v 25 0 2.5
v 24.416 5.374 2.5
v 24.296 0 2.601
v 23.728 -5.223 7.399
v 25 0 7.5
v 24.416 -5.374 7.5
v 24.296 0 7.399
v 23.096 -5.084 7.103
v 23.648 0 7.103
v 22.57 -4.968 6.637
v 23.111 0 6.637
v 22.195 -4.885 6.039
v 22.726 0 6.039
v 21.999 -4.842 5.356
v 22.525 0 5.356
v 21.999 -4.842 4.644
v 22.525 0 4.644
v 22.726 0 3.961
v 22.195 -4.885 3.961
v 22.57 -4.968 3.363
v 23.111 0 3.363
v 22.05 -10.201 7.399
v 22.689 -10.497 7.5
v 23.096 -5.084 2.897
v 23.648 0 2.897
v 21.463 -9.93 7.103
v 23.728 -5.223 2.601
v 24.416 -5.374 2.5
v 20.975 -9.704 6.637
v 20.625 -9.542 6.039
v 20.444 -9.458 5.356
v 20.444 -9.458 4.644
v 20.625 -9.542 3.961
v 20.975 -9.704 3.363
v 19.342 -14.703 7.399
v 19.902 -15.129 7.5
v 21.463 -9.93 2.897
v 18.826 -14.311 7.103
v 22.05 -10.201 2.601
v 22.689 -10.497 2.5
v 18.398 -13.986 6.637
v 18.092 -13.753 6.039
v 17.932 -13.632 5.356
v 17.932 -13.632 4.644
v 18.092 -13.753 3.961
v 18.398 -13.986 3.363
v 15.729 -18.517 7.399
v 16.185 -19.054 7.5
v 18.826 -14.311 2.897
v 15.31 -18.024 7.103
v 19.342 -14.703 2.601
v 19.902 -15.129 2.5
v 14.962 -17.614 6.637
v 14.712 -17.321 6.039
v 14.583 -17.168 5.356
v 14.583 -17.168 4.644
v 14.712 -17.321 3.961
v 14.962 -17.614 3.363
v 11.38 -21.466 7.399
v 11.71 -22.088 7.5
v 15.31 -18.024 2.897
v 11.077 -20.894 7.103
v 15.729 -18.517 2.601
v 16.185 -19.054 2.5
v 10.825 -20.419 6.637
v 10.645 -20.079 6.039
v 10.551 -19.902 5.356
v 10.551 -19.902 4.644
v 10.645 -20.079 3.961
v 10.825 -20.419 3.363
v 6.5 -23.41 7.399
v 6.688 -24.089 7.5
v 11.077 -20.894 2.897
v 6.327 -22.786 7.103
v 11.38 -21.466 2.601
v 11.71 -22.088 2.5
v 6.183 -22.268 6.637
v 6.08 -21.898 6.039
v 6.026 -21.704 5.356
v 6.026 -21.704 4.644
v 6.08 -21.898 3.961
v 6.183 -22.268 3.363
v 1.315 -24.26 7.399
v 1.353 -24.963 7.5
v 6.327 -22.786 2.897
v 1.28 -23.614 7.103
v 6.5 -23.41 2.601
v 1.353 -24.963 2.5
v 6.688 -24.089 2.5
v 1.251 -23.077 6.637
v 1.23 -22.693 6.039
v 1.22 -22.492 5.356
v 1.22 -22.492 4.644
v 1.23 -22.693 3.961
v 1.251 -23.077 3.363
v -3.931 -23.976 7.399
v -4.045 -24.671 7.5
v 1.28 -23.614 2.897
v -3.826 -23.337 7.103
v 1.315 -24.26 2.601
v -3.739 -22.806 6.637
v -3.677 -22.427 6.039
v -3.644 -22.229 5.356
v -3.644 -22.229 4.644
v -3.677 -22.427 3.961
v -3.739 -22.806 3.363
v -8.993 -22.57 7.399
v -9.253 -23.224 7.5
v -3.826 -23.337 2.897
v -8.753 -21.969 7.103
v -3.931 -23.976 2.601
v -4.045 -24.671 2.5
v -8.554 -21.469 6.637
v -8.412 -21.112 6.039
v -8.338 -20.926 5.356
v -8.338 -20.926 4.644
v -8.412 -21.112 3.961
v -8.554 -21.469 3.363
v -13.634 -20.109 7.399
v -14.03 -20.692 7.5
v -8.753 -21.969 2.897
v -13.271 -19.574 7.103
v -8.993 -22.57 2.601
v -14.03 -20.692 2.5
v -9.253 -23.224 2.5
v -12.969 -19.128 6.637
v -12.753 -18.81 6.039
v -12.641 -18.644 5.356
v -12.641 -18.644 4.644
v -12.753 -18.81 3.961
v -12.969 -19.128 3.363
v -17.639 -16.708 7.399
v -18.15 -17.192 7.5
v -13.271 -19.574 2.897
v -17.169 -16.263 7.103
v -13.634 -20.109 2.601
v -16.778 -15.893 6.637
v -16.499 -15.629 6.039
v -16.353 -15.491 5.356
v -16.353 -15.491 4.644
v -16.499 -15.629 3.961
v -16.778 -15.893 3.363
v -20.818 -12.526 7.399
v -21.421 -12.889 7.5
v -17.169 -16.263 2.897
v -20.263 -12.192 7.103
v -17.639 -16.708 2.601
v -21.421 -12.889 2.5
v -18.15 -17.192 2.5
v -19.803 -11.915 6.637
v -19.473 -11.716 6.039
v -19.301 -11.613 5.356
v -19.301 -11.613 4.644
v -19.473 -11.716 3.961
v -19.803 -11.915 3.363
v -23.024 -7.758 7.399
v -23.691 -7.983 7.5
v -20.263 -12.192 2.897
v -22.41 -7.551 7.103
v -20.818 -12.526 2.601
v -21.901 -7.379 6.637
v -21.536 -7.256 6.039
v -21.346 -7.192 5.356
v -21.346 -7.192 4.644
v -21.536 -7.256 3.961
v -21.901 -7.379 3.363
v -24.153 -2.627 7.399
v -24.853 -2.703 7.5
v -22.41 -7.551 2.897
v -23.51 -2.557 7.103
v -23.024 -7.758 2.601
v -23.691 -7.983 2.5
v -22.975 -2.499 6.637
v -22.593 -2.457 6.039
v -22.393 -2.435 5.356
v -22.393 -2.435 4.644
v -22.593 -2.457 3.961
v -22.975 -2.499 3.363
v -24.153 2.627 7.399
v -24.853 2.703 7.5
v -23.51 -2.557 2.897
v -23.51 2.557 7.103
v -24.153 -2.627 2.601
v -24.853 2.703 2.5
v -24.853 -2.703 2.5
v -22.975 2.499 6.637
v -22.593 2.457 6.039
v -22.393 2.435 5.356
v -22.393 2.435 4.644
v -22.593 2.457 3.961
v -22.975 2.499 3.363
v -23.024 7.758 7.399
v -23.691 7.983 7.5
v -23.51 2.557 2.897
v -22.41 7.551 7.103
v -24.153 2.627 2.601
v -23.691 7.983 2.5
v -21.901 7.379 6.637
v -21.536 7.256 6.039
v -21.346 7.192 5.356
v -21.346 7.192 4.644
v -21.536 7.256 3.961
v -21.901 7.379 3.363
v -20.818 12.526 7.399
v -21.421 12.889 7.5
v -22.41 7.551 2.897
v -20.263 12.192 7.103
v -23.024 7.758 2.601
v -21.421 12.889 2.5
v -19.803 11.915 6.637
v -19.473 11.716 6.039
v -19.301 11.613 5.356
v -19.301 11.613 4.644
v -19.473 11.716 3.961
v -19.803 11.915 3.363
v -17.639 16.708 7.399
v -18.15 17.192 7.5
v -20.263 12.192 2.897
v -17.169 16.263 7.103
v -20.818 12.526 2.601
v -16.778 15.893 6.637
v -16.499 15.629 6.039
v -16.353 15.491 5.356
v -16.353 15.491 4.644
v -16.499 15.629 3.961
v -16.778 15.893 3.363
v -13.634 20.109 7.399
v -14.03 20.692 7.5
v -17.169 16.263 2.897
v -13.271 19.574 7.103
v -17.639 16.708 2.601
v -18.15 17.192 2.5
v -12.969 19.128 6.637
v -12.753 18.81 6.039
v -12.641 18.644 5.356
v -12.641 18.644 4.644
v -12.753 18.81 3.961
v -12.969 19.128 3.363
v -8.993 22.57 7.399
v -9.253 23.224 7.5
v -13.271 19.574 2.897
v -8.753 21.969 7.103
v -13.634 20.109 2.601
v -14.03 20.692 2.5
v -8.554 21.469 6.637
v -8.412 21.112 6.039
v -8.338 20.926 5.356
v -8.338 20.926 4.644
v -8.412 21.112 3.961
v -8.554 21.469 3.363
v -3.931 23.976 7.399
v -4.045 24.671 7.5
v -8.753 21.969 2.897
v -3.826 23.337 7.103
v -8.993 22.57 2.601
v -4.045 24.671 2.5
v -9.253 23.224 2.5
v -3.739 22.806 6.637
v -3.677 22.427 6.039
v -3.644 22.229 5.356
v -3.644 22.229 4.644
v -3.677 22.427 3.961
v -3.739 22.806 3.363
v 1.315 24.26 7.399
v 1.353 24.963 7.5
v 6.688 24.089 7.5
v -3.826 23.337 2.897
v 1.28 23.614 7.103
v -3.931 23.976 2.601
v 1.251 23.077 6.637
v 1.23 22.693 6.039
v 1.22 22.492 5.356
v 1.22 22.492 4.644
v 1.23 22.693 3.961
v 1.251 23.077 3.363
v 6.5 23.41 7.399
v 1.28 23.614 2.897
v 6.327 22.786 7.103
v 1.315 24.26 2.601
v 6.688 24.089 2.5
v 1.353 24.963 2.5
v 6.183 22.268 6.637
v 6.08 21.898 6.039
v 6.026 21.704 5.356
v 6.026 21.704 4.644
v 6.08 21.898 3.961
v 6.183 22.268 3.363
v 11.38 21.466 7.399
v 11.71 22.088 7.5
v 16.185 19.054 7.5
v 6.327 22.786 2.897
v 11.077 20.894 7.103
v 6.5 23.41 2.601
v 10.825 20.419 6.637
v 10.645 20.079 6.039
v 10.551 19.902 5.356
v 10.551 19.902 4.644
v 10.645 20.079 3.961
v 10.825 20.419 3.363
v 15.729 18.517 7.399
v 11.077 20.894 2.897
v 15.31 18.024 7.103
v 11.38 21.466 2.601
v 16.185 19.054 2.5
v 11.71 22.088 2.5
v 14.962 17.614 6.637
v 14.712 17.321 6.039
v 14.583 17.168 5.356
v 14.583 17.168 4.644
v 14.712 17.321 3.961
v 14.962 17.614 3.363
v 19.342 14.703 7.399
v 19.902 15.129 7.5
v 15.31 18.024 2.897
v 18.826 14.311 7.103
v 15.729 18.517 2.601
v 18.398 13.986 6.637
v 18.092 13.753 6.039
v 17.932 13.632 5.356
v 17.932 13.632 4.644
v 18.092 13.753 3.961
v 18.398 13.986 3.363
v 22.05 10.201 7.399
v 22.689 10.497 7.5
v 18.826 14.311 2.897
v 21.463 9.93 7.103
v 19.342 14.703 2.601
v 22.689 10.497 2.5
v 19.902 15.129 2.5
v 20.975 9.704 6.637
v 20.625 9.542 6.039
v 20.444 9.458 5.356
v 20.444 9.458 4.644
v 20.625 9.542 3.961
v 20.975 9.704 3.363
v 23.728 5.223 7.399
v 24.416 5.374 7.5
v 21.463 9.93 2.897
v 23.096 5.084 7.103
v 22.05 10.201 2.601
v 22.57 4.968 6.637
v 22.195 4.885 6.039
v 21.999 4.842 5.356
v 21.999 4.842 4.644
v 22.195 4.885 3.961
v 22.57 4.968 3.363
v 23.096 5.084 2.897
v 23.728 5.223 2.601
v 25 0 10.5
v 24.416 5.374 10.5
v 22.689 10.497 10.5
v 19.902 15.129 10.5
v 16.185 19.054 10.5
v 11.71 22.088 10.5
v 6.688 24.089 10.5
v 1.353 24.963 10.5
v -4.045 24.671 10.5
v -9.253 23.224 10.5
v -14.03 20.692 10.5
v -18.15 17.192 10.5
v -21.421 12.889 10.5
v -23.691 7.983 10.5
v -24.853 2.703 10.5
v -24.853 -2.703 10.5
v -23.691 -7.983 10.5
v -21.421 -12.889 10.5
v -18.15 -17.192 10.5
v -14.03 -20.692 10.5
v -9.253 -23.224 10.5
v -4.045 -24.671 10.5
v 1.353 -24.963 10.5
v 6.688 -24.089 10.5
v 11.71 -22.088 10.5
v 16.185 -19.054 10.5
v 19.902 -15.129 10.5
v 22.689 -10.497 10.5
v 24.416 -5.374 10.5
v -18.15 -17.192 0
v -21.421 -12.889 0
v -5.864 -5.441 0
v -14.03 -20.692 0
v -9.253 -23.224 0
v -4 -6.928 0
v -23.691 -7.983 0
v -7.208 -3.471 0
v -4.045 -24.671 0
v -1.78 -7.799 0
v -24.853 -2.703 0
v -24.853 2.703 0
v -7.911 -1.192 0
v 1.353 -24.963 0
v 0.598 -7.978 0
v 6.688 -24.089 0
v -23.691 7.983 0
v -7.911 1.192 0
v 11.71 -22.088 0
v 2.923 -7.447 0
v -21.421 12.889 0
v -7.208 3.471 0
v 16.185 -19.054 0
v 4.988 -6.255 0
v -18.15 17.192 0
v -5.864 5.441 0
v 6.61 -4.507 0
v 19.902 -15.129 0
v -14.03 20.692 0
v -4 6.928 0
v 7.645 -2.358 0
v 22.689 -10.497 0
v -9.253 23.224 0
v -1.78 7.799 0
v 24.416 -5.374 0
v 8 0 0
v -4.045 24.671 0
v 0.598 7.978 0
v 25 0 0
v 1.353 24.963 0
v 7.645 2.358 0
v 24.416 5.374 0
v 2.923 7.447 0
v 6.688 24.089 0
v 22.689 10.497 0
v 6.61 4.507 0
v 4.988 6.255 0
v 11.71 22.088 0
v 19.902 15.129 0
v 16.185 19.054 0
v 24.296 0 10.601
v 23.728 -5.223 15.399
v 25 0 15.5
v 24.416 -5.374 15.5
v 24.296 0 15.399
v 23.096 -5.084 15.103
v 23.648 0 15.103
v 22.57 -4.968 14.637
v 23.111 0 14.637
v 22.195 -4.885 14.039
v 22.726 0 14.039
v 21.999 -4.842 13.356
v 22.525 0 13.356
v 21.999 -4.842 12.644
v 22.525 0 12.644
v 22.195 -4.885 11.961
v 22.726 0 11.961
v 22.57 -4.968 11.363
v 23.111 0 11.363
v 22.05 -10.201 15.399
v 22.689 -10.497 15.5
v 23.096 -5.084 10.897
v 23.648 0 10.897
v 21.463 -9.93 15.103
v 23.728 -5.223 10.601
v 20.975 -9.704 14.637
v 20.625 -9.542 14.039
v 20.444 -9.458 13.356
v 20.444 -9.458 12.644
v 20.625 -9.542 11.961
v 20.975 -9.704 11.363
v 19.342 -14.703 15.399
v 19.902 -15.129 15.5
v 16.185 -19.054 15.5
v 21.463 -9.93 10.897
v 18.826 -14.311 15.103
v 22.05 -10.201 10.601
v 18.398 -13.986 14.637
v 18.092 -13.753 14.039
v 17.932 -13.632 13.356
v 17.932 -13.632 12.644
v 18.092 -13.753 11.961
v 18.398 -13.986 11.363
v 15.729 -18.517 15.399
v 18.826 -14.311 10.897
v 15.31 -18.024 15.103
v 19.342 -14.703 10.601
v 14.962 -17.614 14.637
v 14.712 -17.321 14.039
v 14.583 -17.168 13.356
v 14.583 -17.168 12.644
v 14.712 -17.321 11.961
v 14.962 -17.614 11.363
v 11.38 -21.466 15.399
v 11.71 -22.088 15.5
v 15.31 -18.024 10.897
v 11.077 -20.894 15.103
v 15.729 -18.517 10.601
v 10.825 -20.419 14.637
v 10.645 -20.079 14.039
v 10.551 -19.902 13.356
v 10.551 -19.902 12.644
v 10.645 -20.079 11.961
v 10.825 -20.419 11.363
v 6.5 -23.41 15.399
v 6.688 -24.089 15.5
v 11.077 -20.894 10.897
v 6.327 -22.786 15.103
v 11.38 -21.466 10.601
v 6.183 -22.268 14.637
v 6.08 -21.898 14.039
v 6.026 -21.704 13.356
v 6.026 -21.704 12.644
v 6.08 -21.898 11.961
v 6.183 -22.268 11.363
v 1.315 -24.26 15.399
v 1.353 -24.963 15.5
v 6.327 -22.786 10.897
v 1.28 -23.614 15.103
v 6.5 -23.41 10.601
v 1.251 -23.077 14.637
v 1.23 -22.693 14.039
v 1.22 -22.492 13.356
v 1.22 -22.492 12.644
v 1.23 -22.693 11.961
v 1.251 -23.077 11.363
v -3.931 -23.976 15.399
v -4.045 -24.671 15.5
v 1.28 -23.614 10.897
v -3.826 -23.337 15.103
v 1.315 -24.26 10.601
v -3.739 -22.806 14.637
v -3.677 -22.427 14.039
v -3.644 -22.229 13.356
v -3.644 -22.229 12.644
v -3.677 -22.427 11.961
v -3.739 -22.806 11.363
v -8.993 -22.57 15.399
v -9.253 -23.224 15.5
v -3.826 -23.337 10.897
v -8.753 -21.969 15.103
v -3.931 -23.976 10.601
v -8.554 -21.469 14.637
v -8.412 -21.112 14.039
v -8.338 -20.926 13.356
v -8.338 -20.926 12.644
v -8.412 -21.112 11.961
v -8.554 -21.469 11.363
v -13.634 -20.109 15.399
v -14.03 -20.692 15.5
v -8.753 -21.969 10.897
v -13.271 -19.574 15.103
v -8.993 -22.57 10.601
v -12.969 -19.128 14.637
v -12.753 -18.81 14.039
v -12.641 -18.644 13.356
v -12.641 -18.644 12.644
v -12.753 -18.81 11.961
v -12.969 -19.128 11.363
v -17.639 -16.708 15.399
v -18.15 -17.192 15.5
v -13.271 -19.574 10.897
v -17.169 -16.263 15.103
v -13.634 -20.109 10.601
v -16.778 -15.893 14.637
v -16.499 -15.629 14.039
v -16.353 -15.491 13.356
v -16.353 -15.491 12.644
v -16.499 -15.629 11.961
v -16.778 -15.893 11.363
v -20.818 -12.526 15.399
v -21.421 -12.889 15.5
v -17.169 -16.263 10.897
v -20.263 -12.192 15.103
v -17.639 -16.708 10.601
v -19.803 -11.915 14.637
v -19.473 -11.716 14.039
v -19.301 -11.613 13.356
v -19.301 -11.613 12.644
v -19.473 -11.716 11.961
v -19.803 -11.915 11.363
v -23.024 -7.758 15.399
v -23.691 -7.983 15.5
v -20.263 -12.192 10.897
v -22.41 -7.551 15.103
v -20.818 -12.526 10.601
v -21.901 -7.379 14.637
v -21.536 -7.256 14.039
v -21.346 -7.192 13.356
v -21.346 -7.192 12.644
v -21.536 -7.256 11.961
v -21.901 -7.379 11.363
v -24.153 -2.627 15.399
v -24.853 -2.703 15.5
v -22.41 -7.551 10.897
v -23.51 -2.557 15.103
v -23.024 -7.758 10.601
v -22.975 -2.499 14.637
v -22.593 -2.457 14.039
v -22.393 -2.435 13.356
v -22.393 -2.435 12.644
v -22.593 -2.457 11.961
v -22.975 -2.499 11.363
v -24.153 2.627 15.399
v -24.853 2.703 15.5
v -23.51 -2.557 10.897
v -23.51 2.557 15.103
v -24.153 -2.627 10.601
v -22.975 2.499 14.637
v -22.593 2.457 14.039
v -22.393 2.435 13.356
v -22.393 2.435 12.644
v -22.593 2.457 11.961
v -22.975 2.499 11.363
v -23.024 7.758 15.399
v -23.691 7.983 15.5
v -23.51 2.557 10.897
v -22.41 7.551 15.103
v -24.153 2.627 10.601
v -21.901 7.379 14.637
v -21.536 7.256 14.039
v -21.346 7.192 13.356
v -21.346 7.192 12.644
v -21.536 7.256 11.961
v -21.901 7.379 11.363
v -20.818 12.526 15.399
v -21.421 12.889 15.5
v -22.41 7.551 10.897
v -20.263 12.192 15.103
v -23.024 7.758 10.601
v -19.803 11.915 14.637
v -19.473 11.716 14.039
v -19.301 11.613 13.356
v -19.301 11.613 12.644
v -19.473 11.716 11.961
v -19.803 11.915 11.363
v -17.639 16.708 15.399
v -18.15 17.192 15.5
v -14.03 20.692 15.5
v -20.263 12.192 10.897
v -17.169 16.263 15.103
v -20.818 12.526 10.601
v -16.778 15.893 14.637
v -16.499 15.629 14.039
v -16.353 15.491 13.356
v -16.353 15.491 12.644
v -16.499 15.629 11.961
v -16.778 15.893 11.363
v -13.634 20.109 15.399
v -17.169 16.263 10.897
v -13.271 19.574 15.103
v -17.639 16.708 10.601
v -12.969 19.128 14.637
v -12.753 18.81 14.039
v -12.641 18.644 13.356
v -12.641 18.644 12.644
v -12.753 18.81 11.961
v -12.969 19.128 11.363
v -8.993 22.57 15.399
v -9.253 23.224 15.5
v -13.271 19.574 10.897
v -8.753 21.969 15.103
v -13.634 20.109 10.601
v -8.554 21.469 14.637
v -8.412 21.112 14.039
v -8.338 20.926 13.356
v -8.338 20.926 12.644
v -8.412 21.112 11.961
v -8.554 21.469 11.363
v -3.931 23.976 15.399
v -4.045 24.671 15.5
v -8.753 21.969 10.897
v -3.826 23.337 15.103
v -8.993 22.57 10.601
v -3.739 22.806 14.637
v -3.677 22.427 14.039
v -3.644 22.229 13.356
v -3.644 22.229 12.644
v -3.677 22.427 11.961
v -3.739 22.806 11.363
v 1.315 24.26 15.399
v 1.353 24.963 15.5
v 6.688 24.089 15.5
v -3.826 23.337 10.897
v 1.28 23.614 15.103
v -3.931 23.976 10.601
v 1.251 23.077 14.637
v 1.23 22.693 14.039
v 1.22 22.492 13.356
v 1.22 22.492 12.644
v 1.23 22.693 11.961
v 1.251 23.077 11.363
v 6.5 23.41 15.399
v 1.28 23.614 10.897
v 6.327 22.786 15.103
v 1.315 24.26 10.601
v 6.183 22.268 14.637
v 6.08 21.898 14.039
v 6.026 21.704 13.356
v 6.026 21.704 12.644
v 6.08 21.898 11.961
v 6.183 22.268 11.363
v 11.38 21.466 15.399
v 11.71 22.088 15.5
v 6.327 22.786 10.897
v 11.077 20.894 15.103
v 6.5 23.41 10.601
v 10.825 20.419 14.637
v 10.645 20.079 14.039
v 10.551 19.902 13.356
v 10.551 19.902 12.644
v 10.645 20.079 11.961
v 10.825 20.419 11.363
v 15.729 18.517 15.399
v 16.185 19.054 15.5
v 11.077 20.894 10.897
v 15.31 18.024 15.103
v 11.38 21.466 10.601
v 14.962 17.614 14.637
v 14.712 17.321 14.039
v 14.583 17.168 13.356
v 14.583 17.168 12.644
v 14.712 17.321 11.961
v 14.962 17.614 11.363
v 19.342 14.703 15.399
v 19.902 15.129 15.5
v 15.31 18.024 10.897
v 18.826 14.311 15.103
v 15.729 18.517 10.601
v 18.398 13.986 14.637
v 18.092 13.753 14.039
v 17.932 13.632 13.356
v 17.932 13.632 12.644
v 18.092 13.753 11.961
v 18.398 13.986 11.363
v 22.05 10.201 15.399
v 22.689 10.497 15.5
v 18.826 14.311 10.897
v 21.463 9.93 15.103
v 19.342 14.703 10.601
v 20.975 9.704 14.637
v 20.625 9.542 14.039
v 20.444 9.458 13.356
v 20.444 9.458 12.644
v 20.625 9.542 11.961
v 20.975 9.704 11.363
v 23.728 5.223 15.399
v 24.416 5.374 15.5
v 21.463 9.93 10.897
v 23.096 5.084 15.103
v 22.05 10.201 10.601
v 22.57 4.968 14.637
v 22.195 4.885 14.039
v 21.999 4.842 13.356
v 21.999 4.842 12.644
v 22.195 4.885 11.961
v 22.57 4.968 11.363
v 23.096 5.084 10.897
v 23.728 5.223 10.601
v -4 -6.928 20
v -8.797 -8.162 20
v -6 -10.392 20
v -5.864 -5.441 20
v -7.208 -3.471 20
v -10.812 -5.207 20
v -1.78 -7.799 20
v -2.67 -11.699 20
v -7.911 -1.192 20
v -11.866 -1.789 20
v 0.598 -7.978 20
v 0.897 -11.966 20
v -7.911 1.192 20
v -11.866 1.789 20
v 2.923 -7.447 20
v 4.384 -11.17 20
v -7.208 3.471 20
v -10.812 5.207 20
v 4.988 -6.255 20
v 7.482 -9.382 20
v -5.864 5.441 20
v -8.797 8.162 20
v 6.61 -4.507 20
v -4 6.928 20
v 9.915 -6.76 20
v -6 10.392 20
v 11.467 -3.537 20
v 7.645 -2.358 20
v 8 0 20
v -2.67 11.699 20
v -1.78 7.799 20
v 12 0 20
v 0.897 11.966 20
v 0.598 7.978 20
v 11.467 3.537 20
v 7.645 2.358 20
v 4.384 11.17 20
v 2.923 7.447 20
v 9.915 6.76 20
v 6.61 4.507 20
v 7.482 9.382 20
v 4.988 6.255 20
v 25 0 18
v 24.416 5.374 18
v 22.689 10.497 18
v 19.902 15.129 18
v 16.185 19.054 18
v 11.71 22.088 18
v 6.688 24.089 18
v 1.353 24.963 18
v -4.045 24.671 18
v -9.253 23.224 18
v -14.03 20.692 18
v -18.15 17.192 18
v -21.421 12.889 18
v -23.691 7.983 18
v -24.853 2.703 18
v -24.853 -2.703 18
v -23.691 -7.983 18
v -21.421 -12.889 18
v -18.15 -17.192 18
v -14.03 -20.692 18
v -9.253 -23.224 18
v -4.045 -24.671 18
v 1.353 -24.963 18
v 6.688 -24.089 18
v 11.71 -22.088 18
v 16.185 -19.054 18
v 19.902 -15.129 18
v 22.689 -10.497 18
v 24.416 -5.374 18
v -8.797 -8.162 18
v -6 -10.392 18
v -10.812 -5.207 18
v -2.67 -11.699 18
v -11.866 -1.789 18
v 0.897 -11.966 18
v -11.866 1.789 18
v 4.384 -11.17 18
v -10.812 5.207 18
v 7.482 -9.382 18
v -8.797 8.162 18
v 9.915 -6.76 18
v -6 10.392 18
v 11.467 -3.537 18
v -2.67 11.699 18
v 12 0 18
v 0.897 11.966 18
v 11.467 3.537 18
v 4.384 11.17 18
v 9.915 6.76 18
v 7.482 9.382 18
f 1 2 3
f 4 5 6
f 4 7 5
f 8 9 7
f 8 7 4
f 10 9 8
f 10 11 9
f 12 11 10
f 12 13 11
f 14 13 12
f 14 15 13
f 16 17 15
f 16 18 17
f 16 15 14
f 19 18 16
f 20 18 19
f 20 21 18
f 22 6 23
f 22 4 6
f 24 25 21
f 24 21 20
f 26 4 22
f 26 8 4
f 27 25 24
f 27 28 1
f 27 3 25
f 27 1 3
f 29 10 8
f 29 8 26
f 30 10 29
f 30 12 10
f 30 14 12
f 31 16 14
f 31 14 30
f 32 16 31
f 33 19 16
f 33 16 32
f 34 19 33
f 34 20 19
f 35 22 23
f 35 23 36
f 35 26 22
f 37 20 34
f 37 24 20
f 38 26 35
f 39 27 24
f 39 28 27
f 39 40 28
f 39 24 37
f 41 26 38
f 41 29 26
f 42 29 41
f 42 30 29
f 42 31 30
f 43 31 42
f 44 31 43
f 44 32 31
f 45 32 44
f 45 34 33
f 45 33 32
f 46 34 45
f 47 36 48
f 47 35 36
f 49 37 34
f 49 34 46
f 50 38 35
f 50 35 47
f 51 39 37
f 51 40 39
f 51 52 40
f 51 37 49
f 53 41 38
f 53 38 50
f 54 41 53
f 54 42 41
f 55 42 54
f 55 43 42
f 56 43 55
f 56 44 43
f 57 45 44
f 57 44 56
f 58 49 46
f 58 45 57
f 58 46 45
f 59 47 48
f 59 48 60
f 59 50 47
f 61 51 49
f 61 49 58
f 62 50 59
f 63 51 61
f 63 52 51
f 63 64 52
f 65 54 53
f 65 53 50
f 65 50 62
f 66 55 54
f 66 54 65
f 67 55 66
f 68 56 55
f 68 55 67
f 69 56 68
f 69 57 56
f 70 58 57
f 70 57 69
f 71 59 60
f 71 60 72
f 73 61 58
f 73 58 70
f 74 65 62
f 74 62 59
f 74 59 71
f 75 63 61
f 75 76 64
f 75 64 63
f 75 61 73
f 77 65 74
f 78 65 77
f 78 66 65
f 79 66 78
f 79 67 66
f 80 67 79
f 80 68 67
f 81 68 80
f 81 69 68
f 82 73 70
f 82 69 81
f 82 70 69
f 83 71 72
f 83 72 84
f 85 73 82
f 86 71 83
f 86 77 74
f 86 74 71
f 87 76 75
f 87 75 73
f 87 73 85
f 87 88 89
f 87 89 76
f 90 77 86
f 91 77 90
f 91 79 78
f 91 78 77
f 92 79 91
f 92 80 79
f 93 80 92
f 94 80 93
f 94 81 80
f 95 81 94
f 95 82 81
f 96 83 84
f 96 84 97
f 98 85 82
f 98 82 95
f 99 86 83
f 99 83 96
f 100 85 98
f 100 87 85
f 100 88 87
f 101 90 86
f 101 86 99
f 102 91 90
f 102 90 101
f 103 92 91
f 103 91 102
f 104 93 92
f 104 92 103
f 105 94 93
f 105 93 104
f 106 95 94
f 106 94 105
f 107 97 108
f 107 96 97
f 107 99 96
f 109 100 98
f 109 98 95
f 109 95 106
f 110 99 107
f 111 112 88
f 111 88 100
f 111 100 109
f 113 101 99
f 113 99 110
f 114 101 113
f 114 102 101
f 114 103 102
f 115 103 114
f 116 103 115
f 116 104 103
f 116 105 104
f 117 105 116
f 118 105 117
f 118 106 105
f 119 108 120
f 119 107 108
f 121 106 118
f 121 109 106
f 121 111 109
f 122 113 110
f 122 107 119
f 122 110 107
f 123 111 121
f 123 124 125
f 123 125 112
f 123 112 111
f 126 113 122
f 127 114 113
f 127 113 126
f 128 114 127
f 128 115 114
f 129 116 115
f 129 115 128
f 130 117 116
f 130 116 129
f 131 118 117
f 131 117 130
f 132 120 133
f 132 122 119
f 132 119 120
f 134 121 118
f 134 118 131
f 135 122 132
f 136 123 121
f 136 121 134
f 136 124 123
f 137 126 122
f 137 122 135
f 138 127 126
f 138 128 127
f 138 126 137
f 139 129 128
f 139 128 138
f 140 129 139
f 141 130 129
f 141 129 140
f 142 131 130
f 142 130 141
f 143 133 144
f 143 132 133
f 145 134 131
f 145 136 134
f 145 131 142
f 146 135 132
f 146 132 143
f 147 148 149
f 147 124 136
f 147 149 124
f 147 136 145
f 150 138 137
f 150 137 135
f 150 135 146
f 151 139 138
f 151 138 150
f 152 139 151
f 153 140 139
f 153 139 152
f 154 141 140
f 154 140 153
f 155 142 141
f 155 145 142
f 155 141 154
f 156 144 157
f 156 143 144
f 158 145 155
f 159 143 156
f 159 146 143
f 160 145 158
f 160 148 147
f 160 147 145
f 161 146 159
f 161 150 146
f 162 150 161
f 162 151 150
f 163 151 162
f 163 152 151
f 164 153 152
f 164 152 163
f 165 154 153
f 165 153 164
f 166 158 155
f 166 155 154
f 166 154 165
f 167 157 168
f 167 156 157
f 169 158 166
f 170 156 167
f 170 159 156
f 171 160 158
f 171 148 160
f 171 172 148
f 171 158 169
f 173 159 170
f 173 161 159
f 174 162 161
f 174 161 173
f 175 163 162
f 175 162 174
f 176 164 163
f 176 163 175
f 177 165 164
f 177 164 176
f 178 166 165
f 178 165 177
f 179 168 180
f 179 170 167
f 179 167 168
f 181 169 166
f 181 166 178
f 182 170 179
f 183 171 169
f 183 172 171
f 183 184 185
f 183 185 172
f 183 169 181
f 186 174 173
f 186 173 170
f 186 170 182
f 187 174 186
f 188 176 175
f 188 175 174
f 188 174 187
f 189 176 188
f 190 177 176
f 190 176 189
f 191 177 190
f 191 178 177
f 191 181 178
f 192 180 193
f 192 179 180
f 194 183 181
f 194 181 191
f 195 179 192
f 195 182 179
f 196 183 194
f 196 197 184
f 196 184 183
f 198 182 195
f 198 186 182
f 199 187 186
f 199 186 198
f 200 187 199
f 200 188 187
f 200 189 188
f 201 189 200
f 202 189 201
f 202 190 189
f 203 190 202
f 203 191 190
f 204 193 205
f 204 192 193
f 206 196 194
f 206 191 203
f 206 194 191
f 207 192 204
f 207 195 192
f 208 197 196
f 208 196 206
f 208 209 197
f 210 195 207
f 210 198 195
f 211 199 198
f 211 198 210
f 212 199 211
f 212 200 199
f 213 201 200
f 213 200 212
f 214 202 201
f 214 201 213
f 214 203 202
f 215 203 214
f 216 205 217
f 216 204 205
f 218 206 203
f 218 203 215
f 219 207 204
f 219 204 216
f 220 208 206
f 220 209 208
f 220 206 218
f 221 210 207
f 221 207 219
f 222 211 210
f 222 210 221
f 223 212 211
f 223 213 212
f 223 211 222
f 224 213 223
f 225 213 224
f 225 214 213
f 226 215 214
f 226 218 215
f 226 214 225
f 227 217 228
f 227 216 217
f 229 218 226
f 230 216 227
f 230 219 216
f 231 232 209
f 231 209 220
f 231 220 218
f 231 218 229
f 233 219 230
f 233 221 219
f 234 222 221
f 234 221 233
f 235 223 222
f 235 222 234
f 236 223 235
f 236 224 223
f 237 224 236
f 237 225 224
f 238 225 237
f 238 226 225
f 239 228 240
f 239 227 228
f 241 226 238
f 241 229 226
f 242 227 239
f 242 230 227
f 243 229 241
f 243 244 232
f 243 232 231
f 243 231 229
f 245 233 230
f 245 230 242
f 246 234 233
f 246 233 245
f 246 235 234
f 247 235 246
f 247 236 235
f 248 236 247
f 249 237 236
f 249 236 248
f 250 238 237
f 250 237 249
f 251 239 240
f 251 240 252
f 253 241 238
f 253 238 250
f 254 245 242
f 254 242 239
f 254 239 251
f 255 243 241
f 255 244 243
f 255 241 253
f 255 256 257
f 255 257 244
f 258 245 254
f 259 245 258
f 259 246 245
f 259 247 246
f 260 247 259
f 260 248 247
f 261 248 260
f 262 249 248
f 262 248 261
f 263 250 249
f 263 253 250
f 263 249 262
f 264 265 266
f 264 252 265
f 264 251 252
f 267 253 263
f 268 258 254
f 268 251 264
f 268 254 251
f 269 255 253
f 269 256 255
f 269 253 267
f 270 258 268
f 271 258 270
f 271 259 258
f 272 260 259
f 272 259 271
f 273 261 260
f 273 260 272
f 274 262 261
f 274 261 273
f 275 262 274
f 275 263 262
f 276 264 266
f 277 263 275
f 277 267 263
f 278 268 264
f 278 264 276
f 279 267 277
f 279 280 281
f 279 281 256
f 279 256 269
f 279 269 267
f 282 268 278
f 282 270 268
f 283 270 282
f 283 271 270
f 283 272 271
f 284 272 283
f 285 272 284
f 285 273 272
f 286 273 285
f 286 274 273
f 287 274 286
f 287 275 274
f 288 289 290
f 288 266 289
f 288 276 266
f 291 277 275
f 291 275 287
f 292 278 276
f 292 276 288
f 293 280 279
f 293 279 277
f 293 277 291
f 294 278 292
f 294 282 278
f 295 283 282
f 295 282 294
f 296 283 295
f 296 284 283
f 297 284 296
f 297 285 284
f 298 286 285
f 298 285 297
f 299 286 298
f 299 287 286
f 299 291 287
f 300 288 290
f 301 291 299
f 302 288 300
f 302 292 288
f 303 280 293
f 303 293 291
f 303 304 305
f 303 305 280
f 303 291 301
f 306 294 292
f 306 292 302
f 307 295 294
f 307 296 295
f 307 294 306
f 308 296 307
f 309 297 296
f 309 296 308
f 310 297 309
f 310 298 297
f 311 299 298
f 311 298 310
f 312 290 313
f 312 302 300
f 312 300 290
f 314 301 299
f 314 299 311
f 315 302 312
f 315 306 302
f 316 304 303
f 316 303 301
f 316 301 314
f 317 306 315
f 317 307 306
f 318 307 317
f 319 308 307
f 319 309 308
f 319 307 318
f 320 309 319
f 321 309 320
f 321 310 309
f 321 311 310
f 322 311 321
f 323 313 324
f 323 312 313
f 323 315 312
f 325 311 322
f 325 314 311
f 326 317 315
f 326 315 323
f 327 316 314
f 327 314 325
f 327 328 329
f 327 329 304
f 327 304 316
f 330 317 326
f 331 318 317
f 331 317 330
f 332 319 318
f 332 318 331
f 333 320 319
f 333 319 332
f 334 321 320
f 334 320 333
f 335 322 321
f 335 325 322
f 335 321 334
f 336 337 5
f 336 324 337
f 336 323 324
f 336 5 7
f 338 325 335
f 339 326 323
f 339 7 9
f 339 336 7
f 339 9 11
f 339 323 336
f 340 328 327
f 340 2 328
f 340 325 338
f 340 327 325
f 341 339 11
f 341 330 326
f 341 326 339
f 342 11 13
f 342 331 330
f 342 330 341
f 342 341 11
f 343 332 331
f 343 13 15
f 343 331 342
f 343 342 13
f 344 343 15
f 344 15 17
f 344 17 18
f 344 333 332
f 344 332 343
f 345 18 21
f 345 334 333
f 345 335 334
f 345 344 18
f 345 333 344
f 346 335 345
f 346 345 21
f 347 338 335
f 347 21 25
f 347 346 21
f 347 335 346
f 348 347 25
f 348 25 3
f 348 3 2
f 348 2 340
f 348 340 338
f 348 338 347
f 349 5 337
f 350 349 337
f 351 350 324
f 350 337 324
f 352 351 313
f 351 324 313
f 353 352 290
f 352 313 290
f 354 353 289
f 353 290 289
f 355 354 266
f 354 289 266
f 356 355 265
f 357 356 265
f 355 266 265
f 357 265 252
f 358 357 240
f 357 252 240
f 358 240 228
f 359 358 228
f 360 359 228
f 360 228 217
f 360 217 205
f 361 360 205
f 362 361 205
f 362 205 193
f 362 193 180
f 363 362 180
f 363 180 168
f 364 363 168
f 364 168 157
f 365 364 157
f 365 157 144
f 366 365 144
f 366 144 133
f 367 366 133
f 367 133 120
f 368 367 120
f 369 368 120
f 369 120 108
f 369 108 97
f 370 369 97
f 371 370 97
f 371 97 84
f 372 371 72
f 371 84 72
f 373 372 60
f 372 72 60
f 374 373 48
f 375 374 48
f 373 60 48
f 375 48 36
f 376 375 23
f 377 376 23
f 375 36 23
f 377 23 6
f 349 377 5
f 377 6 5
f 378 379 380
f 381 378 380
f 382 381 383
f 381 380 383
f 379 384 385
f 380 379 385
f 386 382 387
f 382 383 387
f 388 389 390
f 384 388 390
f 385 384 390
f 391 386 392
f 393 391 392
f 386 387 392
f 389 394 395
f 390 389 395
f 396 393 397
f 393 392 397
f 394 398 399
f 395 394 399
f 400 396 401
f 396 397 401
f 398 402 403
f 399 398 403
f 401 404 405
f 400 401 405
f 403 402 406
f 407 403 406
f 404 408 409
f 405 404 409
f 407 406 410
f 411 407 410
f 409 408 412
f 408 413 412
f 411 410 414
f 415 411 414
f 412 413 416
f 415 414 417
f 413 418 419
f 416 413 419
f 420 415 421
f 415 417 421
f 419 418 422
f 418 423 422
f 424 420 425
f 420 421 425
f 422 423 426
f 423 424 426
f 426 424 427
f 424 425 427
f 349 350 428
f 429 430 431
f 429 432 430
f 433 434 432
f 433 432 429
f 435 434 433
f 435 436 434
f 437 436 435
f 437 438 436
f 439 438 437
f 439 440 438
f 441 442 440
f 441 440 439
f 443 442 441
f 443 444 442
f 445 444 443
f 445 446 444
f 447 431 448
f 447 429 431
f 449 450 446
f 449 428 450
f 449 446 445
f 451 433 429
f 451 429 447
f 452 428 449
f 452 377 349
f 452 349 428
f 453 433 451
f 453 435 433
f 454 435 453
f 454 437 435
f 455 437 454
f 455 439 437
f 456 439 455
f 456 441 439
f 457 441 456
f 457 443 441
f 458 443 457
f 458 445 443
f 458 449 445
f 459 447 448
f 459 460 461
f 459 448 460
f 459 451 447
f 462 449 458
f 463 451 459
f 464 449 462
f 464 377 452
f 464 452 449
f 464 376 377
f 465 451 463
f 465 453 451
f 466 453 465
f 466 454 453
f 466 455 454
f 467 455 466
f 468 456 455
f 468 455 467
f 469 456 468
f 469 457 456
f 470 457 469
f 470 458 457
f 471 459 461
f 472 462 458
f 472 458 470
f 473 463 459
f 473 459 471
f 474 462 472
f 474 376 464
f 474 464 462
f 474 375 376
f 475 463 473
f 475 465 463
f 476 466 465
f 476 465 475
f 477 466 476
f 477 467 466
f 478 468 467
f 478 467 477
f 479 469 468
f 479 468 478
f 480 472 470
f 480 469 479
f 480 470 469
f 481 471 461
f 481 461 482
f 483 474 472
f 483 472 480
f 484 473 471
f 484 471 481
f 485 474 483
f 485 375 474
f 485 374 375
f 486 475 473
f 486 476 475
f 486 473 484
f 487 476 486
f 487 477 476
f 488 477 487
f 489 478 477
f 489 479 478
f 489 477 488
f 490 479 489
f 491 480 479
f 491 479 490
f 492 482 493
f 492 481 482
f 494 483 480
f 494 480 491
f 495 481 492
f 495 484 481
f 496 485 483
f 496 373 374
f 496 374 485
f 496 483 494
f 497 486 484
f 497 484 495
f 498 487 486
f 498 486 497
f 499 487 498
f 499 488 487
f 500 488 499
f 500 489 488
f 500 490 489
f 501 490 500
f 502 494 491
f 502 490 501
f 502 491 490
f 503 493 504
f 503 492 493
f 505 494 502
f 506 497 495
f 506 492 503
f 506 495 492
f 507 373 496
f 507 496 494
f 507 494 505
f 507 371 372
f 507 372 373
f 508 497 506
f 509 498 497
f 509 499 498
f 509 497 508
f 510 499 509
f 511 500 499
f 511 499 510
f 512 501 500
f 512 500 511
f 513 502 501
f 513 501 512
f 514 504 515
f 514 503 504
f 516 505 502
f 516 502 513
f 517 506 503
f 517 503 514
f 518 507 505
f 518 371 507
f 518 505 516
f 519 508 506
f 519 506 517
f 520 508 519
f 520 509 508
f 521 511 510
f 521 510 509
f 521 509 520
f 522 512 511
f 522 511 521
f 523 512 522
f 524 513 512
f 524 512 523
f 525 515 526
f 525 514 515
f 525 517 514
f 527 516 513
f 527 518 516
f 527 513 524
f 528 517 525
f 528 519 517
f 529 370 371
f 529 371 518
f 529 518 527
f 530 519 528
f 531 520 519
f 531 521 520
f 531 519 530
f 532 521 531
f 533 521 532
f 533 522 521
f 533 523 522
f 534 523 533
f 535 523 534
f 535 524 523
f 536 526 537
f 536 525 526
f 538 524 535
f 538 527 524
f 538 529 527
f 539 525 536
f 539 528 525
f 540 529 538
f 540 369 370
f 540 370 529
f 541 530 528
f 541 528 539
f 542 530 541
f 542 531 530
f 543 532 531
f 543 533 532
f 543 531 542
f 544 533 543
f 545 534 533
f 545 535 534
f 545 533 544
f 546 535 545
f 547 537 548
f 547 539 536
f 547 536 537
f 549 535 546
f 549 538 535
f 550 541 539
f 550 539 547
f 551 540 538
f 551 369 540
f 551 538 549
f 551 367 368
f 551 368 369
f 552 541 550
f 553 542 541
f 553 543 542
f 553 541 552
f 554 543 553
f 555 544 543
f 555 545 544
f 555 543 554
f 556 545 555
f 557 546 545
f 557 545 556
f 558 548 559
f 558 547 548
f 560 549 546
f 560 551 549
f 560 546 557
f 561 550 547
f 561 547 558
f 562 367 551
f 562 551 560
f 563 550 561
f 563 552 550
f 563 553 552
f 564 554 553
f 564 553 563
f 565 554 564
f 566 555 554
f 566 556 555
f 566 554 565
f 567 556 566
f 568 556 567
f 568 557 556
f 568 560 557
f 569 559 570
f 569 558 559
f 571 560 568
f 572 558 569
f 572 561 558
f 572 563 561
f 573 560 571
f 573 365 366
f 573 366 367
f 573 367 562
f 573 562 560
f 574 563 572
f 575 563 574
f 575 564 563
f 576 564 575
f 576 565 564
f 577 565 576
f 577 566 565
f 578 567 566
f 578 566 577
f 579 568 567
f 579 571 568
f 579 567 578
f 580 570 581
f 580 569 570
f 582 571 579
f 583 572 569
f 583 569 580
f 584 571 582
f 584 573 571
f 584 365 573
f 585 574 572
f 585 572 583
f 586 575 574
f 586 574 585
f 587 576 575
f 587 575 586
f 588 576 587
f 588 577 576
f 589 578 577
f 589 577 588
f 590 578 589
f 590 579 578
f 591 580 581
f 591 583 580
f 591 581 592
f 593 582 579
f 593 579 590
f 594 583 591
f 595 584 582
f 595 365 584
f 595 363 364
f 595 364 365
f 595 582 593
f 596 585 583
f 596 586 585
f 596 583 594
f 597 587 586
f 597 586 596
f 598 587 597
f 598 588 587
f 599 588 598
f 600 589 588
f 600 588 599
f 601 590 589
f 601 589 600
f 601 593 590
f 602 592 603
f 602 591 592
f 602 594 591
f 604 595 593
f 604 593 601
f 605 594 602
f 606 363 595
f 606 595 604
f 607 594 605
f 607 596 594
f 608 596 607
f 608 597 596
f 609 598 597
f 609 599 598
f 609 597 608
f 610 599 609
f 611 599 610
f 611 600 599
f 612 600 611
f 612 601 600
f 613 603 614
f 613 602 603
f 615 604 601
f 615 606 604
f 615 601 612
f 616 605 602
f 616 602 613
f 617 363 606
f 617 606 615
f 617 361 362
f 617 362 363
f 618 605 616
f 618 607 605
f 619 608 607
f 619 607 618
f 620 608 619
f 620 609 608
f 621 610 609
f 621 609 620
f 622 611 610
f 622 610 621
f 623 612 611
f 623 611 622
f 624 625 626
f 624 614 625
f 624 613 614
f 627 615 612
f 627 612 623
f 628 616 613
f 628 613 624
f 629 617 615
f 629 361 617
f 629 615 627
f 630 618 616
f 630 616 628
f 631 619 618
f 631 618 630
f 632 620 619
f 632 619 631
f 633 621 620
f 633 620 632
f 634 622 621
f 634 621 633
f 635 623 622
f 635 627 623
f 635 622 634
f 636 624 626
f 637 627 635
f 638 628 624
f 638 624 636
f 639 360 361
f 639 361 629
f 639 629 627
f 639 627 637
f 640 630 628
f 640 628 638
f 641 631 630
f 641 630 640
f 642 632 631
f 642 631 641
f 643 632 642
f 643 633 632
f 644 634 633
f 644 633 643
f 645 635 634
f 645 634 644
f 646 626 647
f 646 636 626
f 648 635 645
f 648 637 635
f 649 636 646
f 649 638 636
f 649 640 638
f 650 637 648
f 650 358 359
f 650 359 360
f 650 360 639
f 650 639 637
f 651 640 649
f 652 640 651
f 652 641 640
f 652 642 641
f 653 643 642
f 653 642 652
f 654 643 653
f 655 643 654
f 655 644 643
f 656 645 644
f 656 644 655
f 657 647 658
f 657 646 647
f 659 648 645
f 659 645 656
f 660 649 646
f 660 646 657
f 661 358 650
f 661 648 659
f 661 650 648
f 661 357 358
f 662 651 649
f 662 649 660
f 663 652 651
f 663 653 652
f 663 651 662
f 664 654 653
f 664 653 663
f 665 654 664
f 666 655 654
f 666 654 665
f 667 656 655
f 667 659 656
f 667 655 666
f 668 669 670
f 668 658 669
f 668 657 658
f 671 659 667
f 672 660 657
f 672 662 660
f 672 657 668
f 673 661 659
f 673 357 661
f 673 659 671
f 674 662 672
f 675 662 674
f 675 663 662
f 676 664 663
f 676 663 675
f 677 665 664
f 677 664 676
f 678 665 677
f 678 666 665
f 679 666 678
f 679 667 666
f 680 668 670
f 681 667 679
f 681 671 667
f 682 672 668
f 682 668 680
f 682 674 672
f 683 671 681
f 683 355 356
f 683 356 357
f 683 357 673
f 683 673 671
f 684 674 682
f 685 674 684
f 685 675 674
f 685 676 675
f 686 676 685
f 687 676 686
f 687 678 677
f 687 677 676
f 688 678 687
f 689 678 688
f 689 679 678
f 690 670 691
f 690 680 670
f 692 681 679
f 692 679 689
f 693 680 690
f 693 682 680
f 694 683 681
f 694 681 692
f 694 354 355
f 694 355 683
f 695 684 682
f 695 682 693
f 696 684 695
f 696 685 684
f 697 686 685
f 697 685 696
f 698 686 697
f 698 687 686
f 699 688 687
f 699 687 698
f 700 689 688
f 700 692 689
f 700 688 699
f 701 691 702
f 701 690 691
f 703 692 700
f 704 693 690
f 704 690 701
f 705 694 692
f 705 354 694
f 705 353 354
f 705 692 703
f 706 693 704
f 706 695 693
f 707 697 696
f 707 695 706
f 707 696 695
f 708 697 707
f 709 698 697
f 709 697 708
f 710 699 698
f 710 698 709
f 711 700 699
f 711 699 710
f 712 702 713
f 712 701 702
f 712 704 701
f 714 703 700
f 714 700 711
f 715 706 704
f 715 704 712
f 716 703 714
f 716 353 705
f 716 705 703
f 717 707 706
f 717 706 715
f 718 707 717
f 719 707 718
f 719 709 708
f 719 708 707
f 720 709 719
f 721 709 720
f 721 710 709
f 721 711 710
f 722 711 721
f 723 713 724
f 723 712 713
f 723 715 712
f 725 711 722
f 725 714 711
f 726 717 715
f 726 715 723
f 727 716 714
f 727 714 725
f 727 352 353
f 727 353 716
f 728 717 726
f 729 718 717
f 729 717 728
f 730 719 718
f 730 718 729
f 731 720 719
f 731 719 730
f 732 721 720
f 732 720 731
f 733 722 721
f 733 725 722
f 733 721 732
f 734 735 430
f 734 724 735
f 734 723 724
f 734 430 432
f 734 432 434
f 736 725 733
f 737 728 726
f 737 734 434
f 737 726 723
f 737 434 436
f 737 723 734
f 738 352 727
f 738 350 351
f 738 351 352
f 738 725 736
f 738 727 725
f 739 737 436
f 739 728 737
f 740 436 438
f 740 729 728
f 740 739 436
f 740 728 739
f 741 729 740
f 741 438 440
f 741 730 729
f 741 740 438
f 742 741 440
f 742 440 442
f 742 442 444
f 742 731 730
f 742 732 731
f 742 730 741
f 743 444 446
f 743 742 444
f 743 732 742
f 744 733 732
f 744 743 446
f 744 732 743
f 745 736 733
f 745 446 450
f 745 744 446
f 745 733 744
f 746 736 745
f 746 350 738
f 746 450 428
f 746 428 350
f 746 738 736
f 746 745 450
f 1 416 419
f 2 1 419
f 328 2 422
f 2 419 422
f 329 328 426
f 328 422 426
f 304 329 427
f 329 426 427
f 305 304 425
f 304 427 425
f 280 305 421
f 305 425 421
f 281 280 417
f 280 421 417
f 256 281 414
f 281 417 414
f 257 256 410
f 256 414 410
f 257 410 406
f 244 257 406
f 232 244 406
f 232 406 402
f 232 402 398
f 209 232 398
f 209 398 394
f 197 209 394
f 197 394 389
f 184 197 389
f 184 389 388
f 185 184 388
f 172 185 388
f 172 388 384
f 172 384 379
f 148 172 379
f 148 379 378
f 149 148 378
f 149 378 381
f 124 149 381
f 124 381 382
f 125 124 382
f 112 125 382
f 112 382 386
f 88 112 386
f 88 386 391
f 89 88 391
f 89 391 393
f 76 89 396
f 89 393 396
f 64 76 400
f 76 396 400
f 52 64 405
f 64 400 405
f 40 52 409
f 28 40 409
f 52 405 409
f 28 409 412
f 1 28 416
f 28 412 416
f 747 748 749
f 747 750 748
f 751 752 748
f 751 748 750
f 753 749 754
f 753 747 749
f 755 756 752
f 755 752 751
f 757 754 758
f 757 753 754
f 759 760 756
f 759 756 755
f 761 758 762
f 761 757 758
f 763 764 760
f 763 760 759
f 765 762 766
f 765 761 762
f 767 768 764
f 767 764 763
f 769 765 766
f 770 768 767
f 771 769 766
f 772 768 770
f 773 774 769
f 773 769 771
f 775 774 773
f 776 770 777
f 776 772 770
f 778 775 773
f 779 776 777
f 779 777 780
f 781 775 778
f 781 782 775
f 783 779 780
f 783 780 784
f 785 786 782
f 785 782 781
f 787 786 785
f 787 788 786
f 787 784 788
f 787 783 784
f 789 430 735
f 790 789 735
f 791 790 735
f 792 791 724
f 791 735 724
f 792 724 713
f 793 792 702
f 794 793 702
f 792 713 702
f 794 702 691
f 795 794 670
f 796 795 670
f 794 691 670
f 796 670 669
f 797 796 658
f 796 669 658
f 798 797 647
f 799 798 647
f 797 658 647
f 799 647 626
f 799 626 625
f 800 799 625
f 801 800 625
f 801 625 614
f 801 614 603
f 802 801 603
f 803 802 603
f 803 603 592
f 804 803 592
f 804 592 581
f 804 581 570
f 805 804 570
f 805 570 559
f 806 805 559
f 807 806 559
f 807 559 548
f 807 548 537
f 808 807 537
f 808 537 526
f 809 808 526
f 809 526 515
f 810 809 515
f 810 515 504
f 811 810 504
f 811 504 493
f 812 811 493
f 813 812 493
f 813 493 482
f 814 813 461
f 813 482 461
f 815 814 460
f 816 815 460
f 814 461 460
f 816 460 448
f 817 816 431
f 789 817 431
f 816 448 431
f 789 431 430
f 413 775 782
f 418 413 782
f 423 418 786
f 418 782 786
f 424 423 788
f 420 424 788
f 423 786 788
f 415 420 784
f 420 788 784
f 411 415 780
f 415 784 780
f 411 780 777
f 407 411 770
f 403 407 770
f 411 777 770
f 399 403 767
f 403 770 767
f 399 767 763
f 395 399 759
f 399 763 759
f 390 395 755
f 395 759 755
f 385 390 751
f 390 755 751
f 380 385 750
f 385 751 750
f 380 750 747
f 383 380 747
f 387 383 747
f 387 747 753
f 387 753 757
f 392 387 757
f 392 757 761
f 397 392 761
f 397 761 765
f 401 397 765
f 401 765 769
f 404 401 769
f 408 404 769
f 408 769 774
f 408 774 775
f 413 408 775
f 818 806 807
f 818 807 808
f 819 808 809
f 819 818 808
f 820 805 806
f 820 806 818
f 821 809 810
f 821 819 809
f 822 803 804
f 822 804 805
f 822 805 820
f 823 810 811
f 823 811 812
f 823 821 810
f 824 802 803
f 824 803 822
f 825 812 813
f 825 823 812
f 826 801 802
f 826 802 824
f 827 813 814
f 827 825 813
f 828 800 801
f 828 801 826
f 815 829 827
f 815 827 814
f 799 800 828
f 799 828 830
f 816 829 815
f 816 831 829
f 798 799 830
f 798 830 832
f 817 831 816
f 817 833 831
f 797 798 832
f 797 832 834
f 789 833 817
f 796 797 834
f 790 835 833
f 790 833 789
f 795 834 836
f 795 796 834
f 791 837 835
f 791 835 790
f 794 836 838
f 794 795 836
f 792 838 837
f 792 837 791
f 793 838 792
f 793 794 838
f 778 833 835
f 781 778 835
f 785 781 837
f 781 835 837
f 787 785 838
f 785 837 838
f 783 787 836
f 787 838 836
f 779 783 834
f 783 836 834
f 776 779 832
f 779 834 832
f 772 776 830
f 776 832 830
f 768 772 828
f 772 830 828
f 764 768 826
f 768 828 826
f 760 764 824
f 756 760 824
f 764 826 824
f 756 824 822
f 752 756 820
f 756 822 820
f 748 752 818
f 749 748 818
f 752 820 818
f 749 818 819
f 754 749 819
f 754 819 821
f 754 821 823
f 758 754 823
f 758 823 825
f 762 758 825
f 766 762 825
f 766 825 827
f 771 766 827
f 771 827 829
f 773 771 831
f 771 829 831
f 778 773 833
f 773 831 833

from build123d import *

# Parameters (mm, degrees)
F0_R     = 25
F1_DEPTH = 18
F2_R     = 12
F3_DEPTH = 2
F4_R     = 8
F5_DEPTH = 25
F6_R     = 2.5


with BuildPart() as f1:
    # F0 (on Top) → F1 (new body)
    with BuildSketch(Plane.XY):
        Circle(F0_R)
    extrude(amount=F1_DEPTH)

    # F2 (on face) → F3 (join)
    with BuildSketch(Plane.XY.offset(18)):
        Circle(F2_R)
    extrude(amount=F3_DEPTH)

    # F4 (on face) → F5 (cut)
    with BuildSketch(Plane.XY.offset(20)):
        Circle(F4_R)
    extrude(amount=-F5_DEPTH, mode=Mode.SUBTRACT)

    # F6 (on Front) → F8 (revolve, cut)
    with BuildSketch(Plane.XZ):
        with Locations((25, 13)):
            Circle(F6_R)
        with Locations((25, 5)):
            Circle(F6_R)
    revolve(axis=Axis((0, 0, 7.756283), (0, 0, -1)), mode=Mode.SUBTRACT)


solid = f1.part
